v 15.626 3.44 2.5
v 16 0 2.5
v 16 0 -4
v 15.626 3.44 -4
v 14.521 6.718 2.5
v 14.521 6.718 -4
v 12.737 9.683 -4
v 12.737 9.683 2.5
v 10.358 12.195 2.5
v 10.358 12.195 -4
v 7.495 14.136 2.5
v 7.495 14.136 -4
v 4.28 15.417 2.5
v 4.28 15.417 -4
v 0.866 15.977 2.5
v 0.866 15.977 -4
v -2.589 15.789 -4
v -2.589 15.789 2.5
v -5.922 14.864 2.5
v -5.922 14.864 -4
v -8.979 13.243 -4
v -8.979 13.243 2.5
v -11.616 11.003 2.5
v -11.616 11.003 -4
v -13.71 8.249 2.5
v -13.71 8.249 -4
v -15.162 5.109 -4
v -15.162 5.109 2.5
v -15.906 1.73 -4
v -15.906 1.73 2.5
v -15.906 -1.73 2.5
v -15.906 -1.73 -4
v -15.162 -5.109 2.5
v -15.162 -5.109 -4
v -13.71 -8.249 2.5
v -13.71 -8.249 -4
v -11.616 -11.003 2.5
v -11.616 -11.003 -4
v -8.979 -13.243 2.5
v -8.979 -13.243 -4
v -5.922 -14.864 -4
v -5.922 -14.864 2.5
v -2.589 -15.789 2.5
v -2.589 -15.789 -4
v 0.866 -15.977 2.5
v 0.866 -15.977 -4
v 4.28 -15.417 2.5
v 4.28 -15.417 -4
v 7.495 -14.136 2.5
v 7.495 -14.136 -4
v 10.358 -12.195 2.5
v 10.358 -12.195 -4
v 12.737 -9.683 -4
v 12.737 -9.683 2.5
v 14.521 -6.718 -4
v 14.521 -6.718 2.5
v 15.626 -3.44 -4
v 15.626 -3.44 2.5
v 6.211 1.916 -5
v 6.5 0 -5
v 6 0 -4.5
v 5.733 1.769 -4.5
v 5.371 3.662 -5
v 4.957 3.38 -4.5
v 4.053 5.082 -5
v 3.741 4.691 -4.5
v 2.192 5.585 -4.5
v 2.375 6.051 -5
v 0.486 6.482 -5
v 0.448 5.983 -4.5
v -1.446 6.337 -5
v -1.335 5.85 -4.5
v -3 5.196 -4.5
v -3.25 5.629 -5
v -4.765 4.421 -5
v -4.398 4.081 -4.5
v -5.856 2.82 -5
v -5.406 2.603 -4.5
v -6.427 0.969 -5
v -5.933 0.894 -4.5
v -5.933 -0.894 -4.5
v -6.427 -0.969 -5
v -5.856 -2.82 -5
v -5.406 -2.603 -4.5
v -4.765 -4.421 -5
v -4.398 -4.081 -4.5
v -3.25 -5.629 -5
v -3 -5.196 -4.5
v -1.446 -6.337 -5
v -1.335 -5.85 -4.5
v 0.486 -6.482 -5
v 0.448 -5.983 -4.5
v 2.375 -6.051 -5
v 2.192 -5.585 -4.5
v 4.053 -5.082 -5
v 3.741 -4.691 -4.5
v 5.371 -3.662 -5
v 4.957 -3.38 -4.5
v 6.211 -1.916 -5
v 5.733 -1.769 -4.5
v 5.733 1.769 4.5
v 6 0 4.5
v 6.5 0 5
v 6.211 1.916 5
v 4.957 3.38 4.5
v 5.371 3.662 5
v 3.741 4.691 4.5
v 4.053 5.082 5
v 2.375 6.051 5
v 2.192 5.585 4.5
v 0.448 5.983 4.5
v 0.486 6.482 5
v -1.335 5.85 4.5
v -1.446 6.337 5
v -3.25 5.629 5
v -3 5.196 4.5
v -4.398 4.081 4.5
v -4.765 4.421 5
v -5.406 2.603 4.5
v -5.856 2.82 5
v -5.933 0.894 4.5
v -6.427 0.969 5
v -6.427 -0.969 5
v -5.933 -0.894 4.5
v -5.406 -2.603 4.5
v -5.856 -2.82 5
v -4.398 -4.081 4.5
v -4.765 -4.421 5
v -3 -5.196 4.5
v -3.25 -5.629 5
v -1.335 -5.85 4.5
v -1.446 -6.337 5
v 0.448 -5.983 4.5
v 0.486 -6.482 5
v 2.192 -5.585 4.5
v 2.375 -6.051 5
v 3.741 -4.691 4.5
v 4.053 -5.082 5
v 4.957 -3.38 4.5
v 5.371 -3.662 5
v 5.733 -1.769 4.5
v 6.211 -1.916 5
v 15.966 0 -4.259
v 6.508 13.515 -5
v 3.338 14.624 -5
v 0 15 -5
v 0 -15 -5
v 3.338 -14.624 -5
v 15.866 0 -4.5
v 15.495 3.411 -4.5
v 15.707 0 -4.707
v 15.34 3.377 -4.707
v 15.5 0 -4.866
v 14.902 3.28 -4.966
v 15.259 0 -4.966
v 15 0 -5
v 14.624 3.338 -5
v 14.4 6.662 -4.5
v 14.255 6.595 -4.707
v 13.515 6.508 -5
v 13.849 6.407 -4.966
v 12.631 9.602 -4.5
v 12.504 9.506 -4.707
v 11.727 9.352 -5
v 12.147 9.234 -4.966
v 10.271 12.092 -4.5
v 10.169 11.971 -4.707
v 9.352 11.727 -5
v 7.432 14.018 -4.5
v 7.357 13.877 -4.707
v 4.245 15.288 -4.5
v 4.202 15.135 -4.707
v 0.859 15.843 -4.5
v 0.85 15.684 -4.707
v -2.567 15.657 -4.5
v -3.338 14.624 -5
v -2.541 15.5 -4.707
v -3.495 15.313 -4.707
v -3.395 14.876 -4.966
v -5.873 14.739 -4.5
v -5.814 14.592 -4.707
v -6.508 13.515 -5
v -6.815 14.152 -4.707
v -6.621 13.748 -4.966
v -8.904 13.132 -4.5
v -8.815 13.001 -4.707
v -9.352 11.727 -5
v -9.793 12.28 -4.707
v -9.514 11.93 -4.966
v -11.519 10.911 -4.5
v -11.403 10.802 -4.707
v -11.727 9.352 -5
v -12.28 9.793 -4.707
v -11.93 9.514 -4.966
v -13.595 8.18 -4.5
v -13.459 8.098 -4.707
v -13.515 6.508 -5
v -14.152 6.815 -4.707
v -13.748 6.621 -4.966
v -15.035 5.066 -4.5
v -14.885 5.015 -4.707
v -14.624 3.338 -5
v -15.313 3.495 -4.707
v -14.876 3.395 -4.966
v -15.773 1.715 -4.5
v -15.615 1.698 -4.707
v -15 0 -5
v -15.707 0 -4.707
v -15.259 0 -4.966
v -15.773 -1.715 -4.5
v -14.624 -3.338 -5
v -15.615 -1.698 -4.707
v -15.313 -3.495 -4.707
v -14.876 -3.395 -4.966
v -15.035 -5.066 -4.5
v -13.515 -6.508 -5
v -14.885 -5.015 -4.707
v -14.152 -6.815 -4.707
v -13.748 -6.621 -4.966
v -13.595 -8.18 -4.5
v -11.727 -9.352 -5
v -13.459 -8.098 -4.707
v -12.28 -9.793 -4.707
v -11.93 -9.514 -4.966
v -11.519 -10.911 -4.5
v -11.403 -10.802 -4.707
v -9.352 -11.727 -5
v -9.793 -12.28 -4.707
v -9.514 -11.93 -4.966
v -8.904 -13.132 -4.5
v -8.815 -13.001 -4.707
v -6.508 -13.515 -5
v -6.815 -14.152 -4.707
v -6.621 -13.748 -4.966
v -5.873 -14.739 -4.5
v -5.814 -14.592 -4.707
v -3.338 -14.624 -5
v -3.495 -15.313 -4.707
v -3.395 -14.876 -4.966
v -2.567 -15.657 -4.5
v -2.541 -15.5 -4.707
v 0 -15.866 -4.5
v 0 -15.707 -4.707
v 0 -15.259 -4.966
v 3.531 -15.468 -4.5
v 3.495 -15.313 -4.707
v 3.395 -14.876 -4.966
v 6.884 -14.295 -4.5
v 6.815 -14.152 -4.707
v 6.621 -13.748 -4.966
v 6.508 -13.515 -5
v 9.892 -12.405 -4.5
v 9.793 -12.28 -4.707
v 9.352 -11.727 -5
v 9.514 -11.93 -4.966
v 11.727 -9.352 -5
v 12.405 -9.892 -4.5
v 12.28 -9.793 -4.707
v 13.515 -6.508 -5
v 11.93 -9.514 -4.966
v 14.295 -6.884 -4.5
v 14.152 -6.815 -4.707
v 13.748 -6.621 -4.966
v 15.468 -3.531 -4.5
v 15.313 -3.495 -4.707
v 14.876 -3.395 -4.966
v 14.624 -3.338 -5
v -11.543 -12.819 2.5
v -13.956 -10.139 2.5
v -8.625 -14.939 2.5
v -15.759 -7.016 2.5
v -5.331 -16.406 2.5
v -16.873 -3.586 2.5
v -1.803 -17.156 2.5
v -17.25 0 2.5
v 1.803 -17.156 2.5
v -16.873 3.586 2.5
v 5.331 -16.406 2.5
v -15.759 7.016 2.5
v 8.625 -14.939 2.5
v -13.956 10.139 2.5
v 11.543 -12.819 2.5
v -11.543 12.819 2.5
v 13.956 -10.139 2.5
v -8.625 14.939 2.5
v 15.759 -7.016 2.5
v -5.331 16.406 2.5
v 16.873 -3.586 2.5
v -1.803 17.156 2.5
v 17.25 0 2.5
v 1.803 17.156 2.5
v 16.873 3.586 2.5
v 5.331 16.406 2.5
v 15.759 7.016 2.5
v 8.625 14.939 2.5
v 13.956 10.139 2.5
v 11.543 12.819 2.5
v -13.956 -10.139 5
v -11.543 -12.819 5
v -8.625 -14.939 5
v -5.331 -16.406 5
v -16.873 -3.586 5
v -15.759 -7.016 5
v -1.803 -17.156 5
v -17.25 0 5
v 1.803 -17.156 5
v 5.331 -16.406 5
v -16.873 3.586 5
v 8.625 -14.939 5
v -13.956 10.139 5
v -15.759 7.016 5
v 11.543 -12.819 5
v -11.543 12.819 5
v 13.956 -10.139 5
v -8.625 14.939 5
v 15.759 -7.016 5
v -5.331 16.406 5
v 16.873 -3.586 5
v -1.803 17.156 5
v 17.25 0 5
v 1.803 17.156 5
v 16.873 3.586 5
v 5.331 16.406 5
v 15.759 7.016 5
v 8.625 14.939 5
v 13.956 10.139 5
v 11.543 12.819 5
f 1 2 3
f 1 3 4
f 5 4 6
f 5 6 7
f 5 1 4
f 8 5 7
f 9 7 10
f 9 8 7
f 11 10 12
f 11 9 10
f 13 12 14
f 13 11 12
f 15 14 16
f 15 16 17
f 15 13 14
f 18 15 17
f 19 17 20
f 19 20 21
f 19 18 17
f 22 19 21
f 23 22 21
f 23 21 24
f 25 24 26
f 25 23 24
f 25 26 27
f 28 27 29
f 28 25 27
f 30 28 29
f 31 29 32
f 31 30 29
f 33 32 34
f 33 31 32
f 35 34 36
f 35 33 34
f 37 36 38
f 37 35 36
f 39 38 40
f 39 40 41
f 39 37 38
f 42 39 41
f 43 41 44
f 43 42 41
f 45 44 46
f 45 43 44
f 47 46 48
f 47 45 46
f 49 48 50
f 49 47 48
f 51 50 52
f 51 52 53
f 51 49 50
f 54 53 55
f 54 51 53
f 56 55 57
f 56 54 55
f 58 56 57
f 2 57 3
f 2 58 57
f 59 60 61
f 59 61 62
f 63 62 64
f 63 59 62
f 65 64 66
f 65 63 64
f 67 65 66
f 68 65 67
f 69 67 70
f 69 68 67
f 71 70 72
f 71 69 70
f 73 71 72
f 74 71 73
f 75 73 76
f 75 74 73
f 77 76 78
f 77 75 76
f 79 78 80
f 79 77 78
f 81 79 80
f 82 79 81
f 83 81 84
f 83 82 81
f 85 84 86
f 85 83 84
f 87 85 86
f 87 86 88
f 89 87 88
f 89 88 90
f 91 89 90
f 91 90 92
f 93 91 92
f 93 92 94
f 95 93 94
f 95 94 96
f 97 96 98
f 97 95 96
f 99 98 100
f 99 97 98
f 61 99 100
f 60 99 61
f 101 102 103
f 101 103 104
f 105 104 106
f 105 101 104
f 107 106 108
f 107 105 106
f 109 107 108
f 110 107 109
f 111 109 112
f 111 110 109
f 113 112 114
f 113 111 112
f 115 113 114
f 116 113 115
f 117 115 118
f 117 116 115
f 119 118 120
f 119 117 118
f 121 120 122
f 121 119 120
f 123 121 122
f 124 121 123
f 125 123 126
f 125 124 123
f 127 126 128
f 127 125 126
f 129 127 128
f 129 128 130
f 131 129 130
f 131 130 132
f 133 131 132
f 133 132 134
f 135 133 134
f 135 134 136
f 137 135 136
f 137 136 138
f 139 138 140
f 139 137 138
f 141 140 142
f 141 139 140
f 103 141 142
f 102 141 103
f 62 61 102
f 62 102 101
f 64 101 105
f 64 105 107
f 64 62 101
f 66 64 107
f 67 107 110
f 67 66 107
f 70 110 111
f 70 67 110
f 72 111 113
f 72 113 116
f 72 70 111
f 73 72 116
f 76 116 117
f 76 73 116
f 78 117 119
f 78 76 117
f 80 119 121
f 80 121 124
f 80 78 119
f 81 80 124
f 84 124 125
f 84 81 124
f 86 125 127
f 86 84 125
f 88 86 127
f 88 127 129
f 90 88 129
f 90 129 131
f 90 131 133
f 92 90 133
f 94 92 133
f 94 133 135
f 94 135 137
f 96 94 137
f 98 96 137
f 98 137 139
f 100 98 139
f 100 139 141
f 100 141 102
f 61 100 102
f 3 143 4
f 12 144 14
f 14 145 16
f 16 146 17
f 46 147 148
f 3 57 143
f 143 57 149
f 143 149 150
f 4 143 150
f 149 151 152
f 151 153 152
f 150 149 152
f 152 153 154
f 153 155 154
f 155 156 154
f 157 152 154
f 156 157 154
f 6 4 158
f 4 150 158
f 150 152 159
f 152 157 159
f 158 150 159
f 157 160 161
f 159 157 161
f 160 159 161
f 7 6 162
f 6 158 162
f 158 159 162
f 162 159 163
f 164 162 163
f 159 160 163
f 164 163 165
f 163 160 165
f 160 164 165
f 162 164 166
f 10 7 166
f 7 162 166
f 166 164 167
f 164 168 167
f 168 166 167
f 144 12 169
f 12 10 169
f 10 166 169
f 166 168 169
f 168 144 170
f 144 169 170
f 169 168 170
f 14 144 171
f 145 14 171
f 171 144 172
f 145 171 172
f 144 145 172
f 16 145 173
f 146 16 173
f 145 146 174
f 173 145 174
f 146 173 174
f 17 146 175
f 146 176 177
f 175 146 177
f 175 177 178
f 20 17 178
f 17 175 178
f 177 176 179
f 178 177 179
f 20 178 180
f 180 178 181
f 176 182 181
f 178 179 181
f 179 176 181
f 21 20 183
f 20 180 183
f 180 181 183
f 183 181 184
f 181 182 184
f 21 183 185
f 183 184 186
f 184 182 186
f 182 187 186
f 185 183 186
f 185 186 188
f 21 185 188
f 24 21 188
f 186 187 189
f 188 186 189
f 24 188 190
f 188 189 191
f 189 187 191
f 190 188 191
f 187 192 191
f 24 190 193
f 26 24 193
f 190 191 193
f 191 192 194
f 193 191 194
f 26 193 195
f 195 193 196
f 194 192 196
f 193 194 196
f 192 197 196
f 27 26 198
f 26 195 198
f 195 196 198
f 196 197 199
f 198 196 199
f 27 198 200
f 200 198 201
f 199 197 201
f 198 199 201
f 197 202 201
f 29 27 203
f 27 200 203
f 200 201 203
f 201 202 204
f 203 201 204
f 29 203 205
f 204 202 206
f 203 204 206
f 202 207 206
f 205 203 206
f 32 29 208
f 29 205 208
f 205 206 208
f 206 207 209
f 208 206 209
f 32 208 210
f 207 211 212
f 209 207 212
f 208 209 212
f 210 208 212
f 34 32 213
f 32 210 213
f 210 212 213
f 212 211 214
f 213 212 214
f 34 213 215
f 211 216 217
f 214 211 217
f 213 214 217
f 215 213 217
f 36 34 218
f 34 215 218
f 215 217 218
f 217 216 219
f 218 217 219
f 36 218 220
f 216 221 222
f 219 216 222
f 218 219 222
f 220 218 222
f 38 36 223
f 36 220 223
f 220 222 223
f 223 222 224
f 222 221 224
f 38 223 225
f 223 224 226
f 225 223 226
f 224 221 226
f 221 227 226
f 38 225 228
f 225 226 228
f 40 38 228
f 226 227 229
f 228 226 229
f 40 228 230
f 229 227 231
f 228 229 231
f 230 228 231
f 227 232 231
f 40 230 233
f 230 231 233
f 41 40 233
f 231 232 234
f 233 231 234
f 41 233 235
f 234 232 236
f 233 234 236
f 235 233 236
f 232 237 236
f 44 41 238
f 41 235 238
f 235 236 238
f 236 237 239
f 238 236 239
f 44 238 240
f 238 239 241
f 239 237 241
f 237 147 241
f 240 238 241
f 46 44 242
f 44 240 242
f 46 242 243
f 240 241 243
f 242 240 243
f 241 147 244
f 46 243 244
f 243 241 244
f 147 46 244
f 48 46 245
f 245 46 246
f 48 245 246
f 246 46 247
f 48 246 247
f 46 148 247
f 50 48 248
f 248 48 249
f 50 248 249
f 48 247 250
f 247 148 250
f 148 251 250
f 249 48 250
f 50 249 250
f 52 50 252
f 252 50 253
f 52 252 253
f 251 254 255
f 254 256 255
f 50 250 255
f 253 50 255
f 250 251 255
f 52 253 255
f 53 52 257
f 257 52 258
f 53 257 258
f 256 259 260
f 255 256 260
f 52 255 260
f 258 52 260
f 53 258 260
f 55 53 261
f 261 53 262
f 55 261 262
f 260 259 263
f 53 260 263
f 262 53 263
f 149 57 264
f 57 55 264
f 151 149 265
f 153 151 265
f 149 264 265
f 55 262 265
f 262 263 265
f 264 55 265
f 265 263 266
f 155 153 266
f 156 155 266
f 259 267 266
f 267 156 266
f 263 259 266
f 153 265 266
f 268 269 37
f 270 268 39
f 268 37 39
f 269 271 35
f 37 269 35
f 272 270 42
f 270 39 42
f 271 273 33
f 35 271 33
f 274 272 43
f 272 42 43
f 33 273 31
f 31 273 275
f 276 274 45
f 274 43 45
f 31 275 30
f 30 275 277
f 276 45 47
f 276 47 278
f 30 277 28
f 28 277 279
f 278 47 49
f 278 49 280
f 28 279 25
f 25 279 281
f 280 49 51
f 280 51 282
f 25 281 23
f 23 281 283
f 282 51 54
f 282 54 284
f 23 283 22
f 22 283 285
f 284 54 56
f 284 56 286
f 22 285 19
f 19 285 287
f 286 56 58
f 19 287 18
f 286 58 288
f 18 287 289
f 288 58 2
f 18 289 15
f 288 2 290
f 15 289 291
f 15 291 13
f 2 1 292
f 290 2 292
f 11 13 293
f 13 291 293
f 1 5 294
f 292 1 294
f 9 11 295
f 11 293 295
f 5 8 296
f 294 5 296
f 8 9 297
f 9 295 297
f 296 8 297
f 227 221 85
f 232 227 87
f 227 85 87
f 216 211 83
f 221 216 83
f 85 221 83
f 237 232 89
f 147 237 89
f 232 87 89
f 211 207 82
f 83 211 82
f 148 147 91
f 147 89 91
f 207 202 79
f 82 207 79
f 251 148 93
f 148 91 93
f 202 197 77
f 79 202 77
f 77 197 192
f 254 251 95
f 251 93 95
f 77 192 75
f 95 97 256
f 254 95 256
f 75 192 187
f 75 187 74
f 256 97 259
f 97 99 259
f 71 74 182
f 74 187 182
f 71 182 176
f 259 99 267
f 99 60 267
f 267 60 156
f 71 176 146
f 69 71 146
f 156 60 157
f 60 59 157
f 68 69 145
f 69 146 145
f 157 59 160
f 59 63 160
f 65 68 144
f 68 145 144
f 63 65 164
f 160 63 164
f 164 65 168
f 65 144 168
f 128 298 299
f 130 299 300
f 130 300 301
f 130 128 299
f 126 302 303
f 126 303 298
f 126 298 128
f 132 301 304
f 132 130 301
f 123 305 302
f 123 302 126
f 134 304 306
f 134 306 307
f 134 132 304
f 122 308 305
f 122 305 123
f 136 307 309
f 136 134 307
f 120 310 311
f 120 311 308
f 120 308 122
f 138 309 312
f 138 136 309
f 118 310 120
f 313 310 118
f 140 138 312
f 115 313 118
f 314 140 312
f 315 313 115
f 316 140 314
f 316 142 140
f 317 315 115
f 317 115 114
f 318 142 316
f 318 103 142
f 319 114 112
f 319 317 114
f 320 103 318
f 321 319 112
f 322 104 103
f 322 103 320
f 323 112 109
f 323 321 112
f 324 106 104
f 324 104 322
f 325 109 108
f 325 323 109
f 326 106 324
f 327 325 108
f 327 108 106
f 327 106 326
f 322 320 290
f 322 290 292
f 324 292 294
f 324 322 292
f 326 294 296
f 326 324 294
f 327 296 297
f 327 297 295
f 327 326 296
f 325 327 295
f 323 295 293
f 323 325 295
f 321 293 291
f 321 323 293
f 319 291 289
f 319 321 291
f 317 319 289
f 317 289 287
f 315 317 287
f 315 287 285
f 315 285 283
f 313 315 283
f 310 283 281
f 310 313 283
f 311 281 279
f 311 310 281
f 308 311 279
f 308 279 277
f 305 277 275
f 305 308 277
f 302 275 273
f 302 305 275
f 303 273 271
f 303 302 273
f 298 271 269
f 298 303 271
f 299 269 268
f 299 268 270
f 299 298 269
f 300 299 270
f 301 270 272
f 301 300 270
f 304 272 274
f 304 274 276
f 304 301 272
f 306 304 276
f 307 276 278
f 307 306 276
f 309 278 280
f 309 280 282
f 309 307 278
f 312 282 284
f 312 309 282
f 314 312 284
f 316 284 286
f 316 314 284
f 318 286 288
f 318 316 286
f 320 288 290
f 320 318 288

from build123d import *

# Parameters (mm, degrees)
SKETCH_1_R      = 16
SKETCH_1_R_2    = 6
EXTRUDE_1_DEPTH = 5
SKETCH_2_R      = 17.25
SKETCH_2_R_2    = 16
EXTRUDE_2_DEPTH = 2.5
CHAMFER_1_SIZE  = 0.5
FILLET_1_R      = 1


with BuildPart() as part:
    # 草图1 → 凸台-拉伸1 (new, symmetric)
    with BuildSketch(Plane.XY):
        Circle(SKETCH_1_R)
        Circle(SKETCH_1_R_2, mode=Mode.SUBTRACT)
    extrude(amount=EXTRUDE_1_DEPTH, both=True)

    # 草图2 → 凸台-拉伸2 (add)
    with BuildSketch(Plane.XY.offset(5)):
        Circle(SKETCH_2_R)
        Circle(SKETCH_2_R_2, mode=Mode.SUBTRACT)
    extrude(amount=-EXTRUDE_2_DEPTH)

    # 倒角1
    chamfer_1_edges = [part.edges().sort_by_distance(p)[0] for p in [
        (-6, 0, -5),
        (-6, 0, 5),
    ]]
    chamfer(chamfer_1_edges, length=CHAMFER_1_SIZE)

    # 圆角1
    fillet_1_edges = [part.edges().sort_by_distance(p)[0] for p in [
        (-16, 0, -5),
    ]]
    fillet(fillet_1_edges, radius=FILLET_1_R)


solid = part.part
